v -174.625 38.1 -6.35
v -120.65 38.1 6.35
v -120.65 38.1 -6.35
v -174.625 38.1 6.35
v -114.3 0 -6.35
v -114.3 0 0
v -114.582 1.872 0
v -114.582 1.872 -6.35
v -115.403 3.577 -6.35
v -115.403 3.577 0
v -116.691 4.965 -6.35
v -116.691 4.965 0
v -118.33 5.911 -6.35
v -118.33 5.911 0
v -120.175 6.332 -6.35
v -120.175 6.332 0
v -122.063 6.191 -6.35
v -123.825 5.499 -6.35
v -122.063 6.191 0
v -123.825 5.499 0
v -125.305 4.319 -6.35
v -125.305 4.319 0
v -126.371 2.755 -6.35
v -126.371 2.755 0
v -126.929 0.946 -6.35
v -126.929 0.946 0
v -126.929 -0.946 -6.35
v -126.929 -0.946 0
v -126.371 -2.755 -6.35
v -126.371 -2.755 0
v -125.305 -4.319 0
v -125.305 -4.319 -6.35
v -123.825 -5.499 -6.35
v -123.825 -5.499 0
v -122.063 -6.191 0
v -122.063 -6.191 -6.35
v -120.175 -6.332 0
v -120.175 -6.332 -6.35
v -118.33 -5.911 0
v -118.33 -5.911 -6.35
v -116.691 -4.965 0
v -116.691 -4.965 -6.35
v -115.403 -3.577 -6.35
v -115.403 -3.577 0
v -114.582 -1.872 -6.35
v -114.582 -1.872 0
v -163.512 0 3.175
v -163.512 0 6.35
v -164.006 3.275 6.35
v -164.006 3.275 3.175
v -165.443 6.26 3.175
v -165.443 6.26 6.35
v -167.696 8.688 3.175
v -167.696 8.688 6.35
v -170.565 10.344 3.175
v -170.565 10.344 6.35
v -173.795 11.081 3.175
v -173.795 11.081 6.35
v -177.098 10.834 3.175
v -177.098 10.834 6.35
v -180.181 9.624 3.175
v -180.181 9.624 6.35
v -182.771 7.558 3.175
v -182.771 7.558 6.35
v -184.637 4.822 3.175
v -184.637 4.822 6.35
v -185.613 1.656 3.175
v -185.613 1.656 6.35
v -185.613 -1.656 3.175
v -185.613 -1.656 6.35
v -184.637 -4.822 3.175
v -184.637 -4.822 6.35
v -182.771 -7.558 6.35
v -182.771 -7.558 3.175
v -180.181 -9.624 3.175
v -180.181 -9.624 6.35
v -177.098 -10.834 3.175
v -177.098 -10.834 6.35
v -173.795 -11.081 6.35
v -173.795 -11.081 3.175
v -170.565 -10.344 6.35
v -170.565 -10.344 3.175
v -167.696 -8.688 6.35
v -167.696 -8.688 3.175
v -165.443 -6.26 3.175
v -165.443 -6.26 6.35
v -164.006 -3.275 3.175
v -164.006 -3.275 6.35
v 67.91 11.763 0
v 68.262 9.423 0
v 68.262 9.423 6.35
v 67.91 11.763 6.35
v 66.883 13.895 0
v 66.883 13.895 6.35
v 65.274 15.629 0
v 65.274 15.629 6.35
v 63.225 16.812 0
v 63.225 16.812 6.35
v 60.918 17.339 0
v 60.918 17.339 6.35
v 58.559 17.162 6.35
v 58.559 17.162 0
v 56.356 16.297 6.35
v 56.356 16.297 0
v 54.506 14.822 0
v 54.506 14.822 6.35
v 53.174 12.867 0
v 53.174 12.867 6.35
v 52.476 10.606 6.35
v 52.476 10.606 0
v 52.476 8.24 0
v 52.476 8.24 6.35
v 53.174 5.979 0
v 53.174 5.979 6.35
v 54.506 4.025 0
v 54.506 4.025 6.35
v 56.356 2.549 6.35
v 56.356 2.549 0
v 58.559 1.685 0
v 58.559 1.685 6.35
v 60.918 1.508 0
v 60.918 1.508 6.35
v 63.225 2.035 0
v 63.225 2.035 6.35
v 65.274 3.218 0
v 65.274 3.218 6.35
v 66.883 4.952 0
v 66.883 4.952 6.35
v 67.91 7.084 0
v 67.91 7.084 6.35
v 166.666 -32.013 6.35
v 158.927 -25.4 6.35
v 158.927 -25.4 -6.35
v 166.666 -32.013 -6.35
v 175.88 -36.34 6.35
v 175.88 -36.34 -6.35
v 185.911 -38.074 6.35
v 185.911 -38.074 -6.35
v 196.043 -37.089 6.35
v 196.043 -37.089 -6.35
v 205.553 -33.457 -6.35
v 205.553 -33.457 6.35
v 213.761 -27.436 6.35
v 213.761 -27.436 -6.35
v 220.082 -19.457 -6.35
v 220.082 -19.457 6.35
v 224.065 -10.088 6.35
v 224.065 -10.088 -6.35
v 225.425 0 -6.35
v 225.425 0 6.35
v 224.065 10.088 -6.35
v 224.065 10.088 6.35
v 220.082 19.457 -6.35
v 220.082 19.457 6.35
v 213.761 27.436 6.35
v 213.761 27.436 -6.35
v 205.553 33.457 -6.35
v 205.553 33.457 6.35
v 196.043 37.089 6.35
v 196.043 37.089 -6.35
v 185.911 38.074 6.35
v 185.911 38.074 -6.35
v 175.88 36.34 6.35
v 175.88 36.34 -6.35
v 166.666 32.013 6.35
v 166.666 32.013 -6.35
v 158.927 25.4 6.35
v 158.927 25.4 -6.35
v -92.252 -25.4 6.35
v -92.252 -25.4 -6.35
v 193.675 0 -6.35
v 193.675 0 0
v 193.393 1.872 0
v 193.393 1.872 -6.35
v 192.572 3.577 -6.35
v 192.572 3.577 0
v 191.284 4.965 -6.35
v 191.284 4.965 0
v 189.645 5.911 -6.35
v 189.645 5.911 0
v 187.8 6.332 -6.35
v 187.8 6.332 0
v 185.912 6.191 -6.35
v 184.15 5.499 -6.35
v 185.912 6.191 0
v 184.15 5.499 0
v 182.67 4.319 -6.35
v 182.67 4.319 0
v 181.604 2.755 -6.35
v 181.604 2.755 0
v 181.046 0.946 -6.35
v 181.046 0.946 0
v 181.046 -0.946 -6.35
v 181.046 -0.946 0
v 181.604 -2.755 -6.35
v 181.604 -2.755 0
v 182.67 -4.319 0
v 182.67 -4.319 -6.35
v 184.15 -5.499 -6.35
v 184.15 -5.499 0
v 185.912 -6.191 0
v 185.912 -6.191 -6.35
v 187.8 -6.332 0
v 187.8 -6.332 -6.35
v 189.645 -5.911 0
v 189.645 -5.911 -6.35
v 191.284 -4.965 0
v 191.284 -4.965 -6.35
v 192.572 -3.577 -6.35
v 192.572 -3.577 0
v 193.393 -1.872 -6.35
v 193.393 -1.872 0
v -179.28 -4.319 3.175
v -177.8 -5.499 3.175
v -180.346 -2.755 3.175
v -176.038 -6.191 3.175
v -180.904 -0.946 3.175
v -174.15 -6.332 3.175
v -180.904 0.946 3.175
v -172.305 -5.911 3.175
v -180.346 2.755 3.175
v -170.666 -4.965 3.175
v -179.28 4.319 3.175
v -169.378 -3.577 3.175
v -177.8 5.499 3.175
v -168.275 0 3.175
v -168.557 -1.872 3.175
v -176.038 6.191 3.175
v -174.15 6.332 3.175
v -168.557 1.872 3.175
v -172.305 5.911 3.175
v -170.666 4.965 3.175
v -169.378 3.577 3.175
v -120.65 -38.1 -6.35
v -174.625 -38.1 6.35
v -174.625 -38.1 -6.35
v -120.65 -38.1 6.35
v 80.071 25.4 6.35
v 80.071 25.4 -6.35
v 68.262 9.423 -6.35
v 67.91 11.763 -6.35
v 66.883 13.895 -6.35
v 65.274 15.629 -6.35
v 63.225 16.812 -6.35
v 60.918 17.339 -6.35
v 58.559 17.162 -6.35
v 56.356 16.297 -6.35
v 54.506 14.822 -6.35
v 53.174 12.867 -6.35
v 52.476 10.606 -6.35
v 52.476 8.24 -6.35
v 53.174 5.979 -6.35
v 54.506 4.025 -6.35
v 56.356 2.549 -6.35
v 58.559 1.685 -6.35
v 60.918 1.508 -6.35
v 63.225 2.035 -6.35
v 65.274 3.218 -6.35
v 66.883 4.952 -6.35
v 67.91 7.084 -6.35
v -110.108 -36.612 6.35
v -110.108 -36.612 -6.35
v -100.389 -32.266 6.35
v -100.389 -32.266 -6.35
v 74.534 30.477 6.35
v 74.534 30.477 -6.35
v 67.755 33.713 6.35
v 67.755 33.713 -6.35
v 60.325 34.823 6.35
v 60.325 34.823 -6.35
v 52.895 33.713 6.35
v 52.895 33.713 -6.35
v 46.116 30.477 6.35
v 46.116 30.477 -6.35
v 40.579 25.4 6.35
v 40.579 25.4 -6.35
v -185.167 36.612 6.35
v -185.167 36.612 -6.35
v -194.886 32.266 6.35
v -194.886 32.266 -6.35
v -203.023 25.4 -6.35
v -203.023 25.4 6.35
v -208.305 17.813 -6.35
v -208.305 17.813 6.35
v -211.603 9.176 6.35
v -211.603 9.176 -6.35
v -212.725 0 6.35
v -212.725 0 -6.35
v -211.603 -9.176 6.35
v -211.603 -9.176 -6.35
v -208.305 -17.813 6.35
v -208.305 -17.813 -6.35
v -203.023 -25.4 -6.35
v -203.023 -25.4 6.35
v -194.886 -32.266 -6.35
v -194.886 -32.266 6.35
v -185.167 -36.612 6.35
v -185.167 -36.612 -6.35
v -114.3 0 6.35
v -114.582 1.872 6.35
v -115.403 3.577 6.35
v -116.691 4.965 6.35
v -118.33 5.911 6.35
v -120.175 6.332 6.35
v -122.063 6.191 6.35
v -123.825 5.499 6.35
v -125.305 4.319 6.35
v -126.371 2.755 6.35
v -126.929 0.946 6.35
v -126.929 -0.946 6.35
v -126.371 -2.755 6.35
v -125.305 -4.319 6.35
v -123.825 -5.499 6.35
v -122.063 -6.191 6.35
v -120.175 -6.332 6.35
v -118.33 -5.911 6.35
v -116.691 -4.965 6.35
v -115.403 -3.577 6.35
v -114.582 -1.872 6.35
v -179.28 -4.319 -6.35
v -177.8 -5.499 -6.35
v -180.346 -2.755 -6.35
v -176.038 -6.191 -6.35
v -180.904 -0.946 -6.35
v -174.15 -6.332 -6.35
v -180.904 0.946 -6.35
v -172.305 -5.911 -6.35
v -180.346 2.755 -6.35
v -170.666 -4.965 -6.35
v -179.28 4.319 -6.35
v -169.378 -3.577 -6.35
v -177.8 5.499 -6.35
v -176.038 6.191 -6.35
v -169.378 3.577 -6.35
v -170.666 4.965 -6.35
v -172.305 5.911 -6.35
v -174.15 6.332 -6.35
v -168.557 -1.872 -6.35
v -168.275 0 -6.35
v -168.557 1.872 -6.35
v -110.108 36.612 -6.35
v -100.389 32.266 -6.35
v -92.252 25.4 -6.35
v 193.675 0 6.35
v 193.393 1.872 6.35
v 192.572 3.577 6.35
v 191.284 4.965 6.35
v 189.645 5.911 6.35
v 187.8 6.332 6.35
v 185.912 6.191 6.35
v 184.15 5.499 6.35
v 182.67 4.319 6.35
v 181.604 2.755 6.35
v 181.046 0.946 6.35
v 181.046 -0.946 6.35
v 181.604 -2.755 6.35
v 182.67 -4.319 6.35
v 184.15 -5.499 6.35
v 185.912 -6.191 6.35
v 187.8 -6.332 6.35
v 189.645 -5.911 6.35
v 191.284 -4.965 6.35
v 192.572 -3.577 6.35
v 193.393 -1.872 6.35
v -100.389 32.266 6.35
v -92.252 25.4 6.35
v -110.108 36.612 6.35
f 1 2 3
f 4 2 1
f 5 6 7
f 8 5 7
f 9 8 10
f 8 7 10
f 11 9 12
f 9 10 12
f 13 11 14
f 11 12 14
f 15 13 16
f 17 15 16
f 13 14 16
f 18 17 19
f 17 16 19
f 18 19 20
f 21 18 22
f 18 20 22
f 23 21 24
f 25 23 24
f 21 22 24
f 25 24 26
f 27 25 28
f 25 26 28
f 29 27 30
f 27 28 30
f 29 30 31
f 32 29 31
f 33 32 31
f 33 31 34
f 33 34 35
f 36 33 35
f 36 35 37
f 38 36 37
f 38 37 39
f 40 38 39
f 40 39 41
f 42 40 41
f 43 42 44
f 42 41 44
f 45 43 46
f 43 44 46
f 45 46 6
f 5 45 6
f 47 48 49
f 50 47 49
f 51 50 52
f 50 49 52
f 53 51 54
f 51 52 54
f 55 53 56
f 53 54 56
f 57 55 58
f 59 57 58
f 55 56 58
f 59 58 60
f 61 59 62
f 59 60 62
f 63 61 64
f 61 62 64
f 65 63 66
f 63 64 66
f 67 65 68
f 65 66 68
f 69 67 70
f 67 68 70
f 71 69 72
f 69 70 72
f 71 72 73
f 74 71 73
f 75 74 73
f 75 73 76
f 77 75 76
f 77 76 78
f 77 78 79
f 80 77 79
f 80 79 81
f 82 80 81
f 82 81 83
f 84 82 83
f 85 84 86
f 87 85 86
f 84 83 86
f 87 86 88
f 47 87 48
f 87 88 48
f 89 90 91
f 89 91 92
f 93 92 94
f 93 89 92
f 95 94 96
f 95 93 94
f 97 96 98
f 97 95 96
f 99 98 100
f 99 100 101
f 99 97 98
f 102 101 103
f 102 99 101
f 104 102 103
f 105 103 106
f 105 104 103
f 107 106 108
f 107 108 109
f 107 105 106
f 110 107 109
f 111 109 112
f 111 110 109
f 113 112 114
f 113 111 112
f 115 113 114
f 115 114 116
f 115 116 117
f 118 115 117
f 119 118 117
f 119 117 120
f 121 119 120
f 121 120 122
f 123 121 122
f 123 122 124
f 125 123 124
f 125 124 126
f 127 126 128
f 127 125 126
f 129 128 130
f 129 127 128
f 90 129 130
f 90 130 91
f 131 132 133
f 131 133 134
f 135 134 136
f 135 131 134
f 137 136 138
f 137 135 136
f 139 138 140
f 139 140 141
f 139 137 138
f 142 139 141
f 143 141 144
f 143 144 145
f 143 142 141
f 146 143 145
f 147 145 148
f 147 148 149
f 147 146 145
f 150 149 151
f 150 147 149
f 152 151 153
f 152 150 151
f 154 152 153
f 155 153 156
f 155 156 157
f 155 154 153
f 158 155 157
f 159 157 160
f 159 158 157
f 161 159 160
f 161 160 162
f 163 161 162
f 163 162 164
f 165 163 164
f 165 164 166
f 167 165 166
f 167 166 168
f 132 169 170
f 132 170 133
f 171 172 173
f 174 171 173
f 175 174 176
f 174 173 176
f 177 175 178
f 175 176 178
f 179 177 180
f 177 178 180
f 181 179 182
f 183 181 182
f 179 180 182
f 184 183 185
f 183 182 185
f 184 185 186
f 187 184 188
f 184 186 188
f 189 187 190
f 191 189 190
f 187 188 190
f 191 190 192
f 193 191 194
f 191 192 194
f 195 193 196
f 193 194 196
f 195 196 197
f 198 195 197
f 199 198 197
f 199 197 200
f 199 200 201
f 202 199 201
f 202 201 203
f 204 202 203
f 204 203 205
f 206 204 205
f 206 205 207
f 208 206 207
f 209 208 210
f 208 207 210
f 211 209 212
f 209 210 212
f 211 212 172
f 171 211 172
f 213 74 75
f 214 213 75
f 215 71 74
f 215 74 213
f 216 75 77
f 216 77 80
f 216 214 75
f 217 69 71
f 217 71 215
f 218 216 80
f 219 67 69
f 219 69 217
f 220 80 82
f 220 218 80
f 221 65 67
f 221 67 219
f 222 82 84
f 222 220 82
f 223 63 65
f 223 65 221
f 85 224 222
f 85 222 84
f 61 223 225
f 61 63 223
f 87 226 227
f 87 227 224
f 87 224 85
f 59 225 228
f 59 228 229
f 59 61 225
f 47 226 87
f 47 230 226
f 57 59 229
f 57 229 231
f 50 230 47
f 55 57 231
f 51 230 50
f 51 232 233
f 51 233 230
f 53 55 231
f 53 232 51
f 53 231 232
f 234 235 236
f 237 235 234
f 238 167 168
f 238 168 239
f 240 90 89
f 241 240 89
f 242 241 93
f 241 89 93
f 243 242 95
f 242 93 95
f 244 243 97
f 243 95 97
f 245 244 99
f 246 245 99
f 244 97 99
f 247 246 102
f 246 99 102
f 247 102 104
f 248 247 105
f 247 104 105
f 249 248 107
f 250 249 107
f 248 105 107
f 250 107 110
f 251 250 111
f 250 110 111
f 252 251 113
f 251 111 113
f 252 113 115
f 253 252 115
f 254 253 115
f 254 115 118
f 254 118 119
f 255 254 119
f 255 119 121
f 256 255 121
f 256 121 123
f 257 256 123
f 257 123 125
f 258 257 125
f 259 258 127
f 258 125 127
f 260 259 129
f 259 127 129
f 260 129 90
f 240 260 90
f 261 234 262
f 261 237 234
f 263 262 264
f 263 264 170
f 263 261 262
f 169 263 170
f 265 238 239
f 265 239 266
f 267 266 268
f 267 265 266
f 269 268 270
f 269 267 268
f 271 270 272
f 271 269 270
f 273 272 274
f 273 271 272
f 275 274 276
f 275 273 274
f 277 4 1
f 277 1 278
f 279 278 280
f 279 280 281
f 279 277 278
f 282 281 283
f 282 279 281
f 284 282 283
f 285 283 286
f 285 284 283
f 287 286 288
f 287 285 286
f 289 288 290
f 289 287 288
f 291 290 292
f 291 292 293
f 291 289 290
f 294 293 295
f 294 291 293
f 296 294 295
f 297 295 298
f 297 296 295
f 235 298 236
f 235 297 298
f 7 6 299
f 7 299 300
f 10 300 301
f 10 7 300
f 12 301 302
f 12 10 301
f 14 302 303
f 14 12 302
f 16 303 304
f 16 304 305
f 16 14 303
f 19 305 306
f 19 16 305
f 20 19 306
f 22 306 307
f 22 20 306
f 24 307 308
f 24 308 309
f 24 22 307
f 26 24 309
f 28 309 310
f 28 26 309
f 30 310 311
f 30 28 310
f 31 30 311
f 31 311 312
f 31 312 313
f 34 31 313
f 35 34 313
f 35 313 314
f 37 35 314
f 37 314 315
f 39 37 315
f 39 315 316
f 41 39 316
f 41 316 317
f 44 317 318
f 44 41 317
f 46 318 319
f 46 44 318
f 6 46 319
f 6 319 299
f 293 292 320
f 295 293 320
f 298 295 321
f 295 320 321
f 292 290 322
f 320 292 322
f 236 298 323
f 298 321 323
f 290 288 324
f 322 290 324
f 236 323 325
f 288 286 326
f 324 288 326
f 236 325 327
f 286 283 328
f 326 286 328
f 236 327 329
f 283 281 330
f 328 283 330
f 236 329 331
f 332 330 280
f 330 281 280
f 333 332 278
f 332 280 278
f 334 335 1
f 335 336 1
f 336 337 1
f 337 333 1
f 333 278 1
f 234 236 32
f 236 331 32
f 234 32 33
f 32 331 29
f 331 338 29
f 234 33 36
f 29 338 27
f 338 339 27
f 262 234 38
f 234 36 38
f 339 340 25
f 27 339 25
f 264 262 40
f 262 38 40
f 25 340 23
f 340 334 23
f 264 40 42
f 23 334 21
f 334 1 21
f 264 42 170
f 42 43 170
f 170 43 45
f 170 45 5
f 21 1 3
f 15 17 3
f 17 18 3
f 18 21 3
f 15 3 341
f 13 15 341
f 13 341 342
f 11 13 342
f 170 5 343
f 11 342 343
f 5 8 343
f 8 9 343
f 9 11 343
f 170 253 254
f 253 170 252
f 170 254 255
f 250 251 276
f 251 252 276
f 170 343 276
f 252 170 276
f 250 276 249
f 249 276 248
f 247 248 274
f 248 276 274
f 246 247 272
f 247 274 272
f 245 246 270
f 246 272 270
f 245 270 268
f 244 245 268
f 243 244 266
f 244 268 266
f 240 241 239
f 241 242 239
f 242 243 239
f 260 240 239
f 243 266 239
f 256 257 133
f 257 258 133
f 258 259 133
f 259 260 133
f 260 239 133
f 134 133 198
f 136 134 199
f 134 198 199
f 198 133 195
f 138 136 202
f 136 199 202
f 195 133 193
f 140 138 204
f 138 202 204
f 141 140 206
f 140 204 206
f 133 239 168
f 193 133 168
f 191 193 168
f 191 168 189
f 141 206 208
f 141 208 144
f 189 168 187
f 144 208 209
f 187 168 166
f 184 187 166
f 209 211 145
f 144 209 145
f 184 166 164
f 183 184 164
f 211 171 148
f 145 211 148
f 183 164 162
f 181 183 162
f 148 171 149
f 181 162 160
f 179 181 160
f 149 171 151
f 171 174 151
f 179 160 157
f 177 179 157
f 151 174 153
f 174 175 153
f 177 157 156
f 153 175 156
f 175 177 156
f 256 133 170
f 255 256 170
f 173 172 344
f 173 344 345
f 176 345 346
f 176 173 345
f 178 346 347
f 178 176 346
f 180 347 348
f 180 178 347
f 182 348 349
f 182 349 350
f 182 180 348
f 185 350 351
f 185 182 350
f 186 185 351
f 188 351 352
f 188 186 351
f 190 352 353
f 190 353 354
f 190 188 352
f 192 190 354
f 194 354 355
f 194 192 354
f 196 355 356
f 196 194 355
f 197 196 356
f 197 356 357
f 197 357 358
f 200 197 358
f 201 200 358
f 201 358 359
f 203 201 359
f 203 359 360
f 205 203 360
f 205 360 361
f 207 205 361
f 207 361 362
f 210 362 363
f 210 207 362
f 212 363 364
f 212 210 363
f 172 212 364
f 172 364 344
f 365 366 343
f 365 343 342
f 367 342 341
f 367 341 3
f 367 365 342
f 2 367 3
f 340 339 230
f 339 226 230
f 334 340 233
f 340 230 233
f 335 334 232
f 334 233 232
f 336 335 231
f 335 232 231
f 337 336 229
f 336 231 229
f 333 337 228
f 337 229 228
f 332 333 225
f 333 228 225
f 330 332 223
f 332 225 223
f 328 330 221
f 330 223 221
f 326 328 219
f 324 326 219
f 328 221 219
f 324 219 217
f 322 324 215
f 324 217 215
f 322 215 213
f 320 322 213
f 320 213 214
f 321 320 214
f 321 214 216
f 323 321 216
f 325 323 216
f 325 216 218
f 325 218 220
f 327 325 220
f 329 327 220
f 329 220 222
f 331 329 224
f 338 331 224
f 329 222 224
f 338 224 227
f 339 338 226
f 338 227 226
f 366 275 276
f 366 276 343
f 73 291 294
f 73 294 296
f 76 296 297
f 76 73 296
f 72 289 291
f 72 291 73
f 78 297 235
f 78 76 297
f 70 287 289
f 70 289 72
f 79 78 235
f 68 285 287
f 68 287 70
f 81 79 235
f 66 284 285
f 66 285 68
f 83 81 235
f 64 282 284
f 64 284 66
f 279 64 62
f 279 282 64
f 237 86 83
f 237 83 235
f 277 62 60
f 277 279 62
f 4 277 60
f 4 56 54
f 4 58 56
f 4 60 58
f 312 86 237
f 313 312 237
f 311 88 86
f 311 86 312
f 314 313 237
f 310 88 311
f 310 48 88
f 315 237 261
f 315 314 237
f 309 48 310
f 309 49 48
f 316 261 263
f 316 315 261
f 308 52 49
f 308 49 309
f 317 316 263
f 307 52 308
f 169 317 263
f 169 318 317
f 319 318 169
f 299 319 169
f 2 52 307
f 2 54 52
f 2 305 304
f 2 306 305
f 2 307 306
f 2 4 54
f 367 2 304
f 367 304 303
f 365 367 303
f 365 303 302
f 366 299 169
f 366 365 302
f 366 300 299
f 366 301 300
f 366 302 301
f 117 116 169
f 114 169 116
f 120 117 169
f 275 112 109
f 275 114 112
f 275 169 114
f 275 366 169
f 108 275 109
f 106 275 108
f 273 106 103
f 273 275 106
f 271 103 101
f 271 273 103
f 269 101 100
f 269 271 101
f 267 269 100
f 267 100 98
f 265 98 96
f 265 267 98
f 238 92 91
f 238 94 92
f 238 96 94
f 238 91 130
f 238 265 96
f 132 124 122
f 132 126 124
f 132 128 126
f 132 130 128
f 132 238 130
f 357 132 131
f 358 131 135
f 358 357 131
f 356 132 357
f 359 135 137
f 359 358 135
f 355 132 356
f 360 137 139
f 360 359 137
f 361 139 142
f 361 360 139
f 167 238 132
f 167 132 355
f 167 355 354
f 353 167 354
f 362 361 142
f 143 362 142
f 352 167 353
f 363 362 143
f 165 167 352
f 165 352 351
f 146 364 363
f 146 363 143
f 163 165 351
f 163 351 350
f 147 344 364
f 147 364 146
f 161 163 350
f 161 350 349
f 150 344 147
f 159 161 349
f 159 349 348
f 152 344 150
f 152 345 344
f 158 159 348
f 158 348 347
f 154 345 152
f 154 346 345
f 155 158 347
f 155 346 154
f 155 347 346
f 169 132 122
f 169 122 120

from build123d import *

# Parameters (mm, degrees)
F0_R     = 6.35
F0_R_2   = 7.9375
F1_DEPTH = 6.35
F2_R     = 11.1125
F3_DEPTH = 3.175


with BuildPart() as f1:
    # F0 (on Top) → F1 (new body, symmetric)
    with BuildSketch(Plane.XY):
        with BuildLine():
            ThreePointArc((-120.65, -38.1), (-105.0957401333, -34.7803824016), (-92.2519366858, -25.4))
            ThreePointArc((-92.2519366858, -25.4), (-82.55, 0), (-92.2519366858, 25.4))
            ThreePointArc((-92.2519366858, 25.4), (-105.0957401333, 34.7803824016), (-120.65, 38.1))
            Line((-120.65, 38.1), (-174.625, 38.1))
            ThreePointArc((-174.625, 38.1), (-190.1792598667, 34.7803824016), (-203.0230633142, 25.4))
            ThreePointArc((-203.0230633142, 25.4), (-210.2169668893, 13.5949215867), (-212.725, -7.2e-08))
            ThreePointArc((-212.725, -7.2e-08), (-210.2169668636, -13.594921654), (-203.0230633142, -25.4))
            ThreePointArc((-203.0230633142, -25.4), (-190.1792598667, -34.7803824016), (-174.625, -38.1))
            Line((-174.625, -38.1), (-120.65, -38.1))
        make_face()
        with Locations((-174.625, 0)):
            Circle(F0_R, mode=Mode.SUBTRACT)
        with Locations((-120.65, 0)):
            Circle(F0_R, mode=Mode.SUBTRACT)
        with BuildLine():
            Line((-92.2519366858, -25.4), (158.9269366858, -25.4))
            ThreePointArc((158.9269366858, -25.4), (149.225, 0), (158.9269366858, 25.4))
            Line((158.9269366858, 25.4), (80.0710946124, 25.4))
            ThreePointArc((80.0710946124, 25.4), (84.2698408134, 17.8971594032), (85.725, 9.4234))
            ThreePointArc((85.725, 9.4234), (51.8512405968, -14.5214408134), (40.5789053876, 25.4))
            Line((40.5789053876, 25.4), (-92.2519366858, 25.4))
            ThreePointArc((-92.2519366858, 25.4), (-82.55, 0), (-92.2519366858, -25.4))
        make_face()
        with BuildLine():
            ThreePointArc((158.9269366858, 25.4), (149.225, 0), (158.9269366858, -25.4))
            ThreePointArc((158.9269366858, -25.4), (200.9199216204, -35.5919668765), (225.425, 0))
            ThreePointArc((225.425, 0), (200.9199216204, 35.5919668765), (158.9269366858, 25.4))
        make_face()
        with Locations((187.325, 0)):
            Circle(F0_R, mode=Mode.SUBTRACT)
        with BuildLine():
            ThreePointArc((85.725, 9.4234), (84.2698408134, 17.8971594032), (80.0710946124, 25.4))
            Line((80.0710946124, 25.4), (40.5789053876, 25.4))
            ThreePointArc((40.5789053876, 25.4), (51.8512405968, -14.5214408134), (85.725, 9.4234))
        make_face()
        with Locations((60.325, 9.4234)):
            Circle(F0_R_2, mode=Mode.SUBTRACT)
        with BuildLine():
            Line((40.5789053876, 25.4), (80.0710946124, 25.4))
            ThreePointArc((80.0710946124, 25.4), (60.325, 34.8234), (40.5789053876, 25.4))
        make_face()
    extrude(amount=F1_DEPTH, both=True)

    # F2 (on face) → F3 (cut)
    with BuildSketch(Plane.XY.offset(6.35)):
        with Locations((-174.625, 0)):
            Circle(F2_R)
    extrude(amount=-F3_DEPTH, mode=Mode.SUBTRACT)


solid = f1.part
